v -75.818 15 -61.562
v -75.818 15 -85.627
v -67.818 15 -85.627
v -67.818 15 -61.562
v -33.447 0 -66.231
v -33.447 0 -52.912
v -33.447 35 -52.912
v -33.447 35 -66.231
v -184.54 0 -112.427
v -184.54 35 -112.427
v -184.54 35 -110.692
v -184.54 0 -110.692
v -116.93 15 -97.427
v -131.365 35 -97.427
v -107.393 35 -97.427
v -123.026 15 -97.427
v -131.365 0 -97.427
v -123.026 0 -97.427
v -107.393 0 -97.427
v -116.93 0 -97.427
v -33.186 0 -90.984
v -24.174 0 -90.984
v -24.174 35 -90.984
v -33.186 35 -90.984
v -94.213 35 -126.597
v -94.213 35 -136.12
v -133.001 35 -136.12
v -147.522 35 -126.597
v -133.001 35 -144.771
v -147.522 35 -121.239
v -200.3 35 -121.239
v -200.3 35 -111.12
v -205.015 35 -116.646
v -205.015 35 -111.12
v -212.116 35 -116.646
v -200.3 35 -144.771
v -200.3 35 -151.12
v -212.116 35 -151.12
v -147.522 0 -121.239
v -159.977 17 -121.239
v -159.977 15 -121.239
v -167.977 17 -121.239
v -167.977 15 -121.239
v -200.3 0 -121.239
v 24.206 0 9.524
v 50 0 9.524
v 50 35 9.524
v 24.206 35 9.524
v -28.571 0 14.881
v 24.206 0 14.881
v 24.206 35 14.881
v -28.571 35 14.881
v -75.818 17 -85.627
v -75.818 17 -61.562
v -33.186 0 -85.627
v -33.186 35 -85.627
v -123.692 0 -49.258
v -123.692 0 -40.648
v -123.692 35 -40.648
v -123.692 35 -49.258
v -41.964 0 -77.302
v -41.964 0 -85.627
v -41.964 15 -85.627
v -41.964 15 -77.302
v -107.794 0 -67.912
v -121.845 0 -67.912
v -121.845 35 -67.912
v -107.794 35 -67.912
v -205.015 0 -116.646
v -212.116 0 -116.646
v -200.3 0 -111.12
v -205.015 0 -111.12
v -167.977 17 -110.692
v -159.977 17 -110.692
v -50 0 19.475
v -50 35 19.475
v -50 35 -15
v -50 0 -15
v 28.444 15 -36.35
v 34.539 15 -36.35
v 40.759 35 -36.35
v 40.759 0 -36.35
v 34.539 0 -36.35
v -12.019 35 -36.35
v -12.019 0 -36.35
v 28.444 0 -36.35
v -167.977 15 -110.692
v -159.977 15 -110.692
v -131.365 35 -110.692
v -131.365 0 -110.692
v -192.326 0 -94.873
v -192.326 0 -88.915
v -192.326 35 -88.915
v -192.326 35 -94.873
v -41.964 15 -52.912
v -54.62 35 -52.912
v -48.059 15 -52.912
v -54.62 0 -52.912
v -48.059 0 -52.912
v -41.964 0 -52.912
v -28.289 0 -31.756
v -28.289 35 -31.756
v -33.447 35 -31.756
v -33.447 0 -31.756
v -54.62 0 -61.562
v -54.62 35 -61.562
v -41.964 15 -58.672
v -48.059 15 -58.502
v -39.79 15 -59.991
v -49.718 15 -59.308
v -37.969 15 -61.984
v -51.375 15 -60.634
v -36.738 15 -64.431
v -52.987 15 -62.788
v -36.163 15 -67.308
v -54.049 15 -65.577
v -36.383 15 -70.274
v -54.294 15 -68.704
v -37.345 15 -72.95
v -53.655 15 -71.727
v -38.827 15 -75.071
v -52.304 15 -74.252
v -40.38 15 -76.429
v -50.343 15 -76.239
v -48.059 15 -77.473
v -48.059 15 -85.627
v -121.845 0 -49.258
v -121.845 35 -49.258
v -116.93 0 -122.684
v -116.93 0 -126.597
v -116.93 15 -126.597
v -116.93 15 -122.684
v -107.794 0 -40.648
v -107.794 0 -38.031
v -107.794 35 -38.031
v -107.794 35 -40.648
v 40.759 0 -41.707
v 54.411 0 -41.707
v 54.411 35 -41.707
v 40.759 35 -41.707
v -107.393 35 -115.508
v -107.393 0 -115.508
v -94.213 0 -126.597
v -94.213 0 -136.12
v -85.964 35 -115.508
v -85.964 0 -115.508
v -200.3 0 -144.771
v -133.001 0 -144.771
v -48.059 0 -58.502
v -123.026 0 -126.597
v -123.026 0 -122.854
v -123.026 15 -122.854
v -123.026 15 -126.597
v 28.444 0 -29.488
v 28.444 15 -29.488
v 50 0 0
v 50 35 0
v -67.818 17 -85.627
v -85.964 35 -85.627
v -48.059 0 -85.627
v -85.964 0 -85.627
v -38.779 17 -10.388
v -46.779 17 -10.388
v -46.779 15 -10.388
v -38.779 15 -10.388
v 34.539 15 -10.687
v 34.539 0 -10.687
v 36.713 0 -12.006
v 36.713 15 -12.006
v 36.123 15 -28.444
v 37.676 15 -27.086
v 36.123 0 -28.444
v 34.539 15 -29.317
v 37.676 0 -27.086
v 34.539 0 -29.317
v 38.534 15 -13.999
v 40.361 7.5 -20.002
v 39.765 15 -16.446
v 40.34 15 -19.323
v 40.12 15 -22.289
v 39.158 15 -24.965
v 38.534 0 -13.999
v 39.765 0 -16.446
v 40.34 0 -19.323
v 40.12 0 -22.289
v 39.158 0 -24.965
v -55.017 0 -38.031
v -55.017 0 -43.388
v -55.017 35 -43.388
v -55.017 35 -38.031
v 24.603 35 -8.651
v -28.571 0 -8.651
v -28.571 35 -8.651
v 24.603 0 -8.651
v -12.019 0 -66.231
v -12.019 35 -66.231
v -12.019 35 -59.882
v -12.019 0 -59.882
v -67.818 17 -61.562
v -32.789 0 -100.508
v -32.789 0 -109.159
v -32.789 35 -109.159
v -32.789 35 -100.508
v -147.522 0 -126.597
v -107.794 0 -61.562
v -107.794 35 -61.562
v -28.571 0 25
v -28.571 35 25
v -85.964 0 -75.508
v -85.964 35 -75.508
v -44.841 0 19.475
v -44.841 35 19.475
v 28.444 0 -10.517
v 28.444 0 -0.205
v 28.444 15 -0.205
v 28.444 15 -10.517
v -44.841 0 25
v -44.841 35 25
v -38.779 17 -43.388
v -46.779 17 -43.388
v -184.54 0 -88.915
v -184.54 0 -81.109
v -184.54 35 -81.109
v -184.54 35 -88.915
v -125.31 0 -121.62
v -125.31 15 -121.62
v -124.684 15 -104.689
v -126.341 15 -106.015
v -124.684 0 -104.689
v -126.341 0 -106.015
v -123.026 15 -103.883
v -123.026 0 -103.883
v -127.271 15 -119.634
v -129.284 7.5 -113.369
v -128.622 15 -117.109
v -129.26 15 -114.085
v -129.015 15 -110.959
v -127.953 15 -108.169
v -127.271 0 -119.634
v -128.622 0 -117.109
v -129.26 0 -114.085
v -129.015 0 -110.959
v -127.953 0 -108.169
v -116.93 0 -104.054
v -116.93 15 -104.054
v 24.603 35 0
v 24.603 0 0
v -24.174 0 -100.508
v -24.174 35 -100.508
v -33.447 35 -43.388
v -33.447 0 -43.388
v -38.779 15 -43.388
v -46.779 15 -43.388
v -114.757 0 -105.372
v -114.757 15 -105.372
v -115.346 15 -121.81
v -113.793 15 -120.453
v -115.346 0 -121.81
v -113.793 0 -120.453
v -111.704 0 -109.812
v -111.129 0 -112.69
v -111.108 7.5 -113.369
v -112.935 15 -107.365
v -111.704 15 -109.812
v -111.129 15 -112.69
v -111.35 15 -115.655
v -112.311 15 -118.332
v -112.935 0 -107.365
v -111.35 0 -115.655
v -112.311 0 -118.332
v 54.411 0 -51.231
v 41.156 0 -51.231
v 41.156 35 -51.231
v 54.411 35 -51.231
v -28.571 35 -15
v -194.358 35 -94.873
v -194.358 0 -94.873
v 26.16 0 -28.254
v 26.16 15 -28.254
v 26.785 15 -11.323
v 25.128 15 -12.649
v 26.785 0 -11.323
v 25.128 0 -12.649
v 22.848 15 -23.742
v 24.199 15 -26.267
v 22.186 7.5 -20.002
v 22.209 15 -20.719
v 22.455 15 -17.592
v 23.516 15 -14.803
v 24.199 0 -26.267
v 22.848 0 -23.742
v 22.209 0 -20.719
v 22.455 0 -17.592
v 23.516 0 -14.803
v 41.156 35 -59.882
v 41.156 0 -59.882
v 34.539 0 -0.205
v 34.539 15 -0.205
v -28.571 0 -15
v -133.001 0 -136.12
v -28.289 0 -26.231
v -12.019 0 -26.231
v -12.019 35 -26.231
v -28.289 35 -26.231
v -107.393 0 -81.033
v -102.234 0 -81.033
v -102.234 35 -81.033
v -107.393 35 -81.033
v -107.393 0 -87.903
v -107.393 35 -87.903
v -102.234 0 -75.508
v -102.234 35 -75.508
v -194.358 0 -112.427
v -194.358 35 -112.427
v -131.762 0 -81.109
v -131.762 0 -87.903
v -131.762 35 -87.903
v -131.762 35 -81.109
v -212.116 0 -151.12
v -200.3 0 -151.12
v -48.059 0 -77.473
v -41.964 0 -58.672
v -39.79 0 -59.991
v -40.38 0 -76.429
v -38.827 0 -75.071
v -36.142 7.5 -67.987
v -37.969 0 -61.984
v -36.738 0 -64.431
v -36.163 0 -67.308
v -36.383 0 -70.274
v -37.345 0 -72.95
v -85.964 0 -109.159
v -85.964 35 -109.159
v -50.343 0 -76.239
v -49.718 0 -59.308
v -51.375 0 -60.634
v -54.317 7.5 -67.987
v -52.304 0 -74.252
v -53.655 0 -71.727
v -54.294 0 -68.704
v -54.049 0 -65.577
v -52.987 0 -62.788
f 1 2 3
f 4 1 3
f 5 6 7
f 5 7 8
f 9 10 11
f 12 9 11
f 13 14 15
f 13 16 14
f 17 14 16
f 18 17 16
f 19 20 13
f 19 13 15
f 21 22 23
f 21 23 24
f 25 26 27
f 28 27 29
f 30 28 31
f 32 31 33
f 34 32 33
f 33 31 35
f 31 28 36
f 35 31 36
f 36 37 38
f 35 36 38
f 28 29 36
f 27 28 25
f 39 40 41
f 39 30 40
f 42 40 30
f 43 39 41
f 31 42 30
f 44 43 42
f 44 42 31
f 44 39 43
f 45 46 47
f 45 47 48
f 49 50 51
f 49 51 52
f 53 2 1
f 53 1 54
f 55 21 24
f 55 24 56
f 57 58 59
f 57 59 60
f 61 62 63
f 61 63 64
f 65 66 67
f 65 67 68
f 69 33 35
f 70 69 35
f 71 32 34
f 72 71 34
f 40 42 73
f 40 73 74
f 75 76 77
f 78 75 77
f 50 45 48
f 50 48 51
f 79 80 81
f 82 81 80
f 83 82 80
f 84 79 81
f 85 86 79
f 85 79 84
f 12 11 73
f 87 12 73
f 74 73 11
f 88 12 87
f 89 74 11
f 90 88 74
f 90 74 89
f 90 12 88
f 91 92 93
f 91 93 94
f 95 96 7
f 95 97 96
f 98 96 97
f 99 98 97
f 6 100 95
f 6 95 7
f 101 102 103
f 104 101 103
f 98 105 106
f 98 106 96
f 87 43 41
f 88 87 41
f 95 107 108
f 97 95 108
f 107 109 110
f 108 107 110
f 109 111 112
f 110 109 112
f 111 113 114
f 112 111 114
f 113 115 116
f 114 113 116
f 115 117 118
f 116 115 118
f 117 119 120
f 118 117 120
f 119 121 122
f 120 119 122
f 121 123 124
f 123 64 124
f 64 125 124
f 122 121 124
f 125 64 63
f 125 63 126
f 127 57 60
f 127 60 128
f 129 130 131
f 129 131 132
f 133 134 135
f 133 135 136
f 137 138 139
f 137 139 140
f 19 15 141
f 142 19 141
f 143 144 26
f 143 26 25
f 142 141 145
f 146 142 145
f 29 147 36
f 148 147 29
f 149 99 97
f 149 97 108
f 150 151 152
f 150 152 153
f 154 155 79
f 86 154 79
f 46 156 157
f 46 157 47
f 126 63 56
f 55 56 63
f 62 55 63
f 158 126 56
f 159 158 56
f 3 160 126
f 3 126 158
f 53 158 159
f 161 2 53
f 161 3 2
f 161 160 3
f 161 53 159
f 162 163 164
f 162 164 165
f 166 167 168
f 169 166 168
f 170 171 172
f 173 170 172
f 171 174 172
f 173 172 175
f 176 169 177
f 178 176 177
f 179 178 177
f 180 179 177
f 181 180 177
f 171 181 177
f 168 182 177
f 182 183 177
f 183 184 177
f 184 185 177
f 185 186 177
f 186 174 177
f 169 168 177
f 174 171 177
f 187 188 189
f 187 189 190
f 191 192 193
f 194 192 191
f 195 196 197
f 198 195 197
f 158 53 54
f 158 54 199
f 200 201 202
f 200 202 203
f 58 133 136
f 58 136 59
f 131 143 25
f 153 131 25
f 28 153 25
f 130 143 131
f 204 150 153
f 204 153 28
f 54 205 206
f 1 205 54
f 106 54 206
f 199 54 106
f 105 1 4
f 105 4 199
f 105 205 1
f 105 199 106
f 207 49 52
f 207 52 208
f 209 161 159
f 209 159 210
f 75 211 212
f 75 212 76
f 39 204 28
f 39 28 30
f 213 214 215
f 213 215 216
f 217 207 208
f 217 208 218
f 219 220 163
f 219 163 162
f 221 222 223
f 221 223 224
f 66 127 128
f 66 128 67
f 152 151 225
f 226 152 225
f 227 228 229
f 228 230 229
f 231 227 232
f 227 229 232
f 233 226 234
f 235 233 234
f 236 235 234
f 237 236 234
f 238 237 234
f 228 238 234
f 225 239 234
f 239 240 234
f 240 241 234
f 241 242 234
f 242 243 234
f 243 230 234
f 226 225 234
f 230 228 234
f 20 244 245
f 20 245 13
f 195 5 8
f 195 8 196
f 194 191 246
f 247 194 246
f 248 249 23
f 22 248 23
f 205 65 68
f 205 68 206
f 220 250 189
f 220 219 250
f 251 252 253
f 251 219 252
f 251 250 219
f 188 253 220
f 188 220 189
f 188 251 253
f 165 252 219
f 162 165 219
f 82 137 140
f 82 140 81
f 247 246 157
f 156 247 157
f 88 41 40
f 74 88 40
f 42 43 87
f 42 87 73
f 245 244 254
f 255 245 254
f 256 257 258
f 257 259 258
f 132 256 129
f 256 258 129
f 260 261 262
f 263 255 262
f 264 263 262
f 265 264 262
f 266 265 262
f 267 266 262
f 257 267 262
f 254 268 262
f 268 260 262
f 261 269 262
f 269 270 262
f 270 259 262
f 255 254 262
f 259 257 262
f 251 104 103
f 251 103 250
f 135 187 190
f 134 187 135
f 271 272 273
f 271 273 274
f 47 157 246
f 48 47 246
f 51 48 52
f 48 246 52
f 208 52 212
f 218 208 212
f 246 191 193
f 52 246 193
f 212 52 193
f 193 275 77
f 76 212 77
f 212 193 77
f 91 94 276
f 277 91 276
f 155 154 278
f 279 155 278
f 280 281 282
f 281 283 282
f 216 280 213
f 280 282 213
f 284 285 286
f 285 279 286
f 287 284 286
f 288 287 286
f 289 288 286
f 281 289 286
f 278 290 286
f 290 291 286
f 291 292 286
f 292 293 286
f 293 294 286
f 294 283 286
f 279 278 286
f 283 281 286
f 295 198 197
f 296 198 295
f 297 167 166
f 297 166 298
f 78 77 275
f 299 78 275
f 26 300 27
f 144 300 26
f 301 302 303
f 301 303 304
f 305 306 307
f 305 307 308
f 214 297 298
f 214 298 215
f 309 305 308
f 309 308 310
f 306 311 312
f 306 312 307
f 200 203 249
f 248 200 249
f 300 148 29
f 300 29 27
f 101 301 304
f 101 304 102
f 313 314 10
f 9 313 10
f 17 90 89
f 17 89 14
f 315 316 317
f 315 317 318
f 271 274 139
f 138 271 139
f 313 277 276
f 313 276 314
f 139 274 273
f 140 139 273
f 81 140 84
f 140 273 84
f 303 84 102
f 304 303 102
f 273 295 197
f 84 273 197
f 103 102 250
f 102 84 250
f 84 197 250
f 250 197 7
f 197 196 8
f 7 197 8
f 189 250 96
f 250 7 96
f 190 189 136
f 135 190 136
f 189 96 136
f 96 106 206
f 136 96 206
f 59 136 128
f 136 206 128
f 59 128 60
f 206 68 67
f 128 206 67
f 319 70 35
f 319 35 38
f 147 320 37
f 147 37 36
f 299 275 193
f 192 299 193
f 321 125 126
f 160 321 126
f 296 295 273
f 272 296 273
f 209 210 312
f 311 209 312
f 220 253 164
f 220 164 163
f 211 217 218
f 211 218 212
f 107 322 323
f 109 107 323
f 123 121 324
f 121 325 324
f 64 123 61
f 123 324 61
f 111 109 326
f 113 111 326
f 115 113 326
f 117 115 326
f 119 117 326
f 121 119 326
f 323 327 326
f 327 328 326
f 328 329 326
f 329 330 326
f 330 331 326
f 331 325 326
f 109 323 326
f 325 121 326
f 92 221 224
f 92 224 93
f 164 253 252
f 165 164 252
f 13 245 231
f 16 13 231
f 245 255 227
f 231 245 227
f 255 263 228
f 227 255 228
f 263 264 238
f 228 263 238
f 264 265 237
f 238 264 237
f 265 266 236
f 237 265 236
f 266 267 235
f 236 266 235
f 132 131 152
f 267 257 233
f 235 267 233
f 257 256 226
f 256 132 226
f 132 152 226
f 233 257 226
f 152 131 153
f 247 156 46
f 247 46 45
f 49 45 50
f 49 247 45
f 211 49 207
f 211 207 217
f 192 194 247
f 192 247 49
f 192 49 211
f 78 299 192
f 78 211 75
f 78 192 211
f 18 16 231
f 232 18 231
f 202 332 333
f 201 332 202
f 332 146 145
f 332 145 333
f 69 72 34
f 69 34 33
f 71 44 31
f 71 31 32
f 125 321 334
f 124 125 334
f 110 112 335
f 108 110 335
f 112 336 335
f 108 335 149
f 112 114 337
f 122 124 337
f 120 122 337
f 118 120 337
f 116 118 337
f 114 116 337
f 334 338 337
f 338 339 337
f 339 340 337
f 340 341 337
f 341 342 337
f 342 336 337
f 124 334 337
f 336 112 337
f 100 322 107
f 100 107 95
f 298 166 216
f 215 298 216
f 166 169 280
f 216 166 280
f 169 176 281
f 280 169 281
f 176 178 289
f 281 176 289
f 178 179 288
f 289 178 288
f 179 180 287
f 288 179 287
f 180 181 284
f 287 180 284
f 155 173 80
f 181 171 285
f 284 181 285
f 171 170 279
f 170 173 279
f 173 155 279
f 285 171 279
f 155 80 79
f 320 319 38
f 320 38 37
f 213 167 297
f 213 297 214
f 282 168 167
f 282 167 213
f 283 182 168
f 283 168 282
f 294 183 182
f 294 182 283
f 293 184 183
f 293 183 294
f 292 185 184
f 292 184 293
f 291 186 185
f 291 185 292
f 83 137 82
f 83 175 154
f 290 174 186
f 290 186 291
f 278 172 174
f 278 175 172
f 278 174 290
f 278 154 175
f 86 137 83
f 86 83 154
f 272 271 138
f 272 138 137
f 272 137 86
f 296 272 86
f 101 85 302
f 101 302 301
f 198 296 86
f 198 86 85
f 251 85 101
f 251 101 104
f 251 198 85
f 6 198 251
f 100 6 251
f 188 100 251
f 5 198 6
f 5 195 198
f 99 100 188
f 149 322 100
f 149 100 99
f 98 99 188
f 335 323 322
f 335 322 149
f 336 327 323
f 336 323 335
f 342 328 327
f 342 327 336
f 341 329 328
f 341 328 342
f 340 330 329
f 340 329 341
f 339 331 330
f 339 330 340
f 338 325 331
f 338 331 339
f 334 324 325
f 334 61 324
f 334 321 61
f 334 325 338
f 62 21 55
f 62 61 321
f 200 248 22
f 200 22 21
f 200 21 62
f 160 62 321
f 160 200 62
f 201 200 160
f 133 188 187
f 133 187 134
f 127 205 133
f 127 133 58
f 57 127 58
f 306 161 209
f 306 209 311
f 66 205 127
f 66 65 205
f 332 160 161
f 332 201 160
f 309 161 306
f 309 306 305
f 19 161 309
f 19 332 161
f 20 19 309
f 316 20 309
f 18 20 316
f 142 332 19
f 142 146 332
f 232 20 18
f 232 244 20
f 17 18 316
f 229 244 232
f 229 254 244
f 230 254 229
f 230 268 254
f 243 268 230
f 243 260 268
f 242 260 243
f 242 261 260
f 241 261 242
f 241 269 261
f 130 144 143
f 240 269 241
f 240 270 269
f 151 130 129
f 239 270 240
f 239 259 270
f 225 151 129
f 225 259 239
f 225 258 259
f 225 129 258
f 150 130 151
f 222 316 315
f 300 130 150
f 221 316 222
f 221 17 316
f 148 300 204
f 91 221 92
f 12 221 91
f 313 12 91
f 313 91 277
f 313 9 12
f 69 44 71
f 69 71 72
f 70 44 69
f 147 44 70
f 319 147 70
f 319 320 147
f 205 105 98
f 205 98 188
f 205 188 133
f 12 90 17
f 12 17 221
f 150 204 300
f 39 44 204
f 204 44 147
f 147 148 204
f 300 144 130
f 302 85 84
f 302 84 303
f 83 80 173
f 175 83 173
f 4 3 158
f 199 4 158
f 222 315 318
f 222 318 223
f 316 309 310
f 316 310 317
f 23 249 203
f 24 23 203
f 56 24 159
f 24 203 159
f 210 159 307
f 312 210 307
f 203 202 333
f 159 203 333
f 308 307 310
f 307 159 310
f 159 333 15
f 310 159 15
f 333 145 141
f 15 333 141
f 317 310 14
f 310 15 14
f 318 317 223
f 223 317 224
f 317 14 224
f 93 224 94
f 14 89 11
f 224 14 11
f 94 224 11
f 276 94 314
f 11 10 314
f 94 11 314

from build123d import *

# Parameters (mm, degrees)
EXTRUDE_1_DEPTH   = 35
EXTRUDE_1_2_DEPTH = 35
EXTRUDE_1_3_DEPTH = 35
EXTRUDE_1_4_DEPTH = 35
EXTRUDE_2_DEPTH   = 15
SKETCH_3_W        = 8
SKETCH_3_H        = 2
EXTRUDE_3_DEPTH   = 23
SKETCH_4_W        = 8
SKETCH_4_H        = 2
EXTRUDE_4_DEPTH   = 30
SKETCH_5_W        = 8
SKETCH_5_H        = 2
EXTRUDE_5_DEPTH   = 33


with BuildPart() as part:
    # 草图1 → 凸台-拉伸1 (new body)
    with BuildSketch(Plane(origin=(0, 0, 0), x_dir=(1, 0, 0), z_dir=(0, 1, 0))):
        Polygon((-50, 15), (-28.571428571, 15), (-28.571428571, 8.650793651), (24.603174603, 8.650793651), (24.603174603, 0), (50, 0), (50, -9.523809524), (24.206349206, -9.523809524), (24.206349206, -14.880952381), (-28.571428571, -14.880952381), (-28.571428571, -25), (-44.841269841, -25), (-44.841269841, -19.474869842), (-50, -19.474869842), align=None)
    extrude(amount=EXTRUDE_1_DEPTH)


with BuildPart() as body_2:
    # 草图1 → Extrude 1 2 (new body)
    with BuildSketch(Plane(origin=(0, 0, 0), x_dir=(1, 0, 0), z_dir=(0, 1, 0))):
        Polygon((-107.794400387, 61.56232169), (-54.619797212, 61.56232169), (-54.619797212, 52.91152804), (-33.447399942, 52.91152804), (-33.447399942, 66.231254849), (-12.018828513, 66.231254849), (-12.018828513, 59.8820485), (41.155774662, 59.8820485), (41.155774662, 51.231254849), (54.410686269, 51.231254849), (54.410686269, 41.707445325), (40.758949265, 41.707445325), (40.758949265, 36.350302468), (-12.018828513, 36.350302468), (-12.018828513, 26.231254849), (-28.288669783, 26.231254849), (-28.288669783, 31.756385007), (-33.447399942, 31.756385007), (-33.447399942, 43.387718516), (-55.016622609, 43.387718516), (-55.016622609, 38.030575659), (-107.794400387, 38.030575659), (-107.794400387, 40.648099537), (-123.6923492, 40.648099537), (-123.6923492, 49.25836902), (-121.845067006, 49.25836902), (-121.845067006, 67.91152804), (-107.794400387, 67.91152804), align=None)
    extrude(amount=EXTRUDE_1_2_DEPTH)



with BuildPart() as body_3:
    # 草图1 → Extrude 1 3 (new body)
    with BuildSketch(Plane(origin=(0, 0, 0), x_dir=(1, 0, 0), z_dir=(0, 1, 0))):
        Polygon((-184.539969284, 110.691667643), (-131.365366109, 110.691667643), (-131.365366109, 97.427275906), (-107.392513521, 97.427275906), (-107.392513521, 115.507776756), (-85.963942093, 115.507776756), (-85.963942093, 109.158570406), (-32.789338918, 109.158570406), (-32.789338918, 100.507776756), (-24.173934052, 100.507776756), (-24.173934052, 90.983967232), (-33.186164315, 90.983967232), (-33.186164315, 85.626824375), (-85.963942093, 85.626824375), (-85.963942093, 75.507776756), (-102.233783362, 75.507776756), (-102.233783362, 81.032906914), (-107.392513521, 81.032906914), (-107.392513521, 87.903466382), (-131.762191506, 87.903466382), (-131.762191506, 81.109403196), (-184.539969284, 81.109403196), (-184.539969284, 88.915387374), (-192.325966845, 88.915387374), (-192.325966845, 94.87339593), (-194.358266929, 94.87339593), (-194.358266929, 112.427275906), (-184.539969284, 112.427275906), align=None)
    extrude(amount=EXTRUDE_1_3_DEPTH)


with BuildPart() as body_4:
    # 草图1 → Extrude 1 4 (new body)
    with BuildSketch(Plane(origin=(0, 0, 0), x_dir=(1, 0, 0), z_dir=(0, 1, 0))):
        Polygon((-200.299569392, 144.7711918), (-133.000655414, 144.7711918), (-133.000655414, 136.120398149), (-94.213200191, 136.120398149), (-94.213200191, 126.596588625), (-147.521791614, 126.596588625), (-147.521791614, 121.239445768), (-200.299569392, 121.239445768), (-200.299569392, 111.120398149), (-205.014733331, 111.120398149), (-205.014733331, 116.645528307), (-212.116113646, 116.645528307), (-212.116113646, 151.120398149), (-200.299569392, 151.120398149), align=None)
    extrude(amount=EXTRUDE_1_4_DEPTH)


with BuildPart() as body_2_1:
    add(body_2.part)

    add(body_3.part)  # 凸台-拉伸2 merges body 3

    add(body_4.part)  # 凸台-拉伸2 merges body 4
    # 草图2 → 凸台-拉伸2 (add)
    with BuildSketch(Plane(origin=(0, 0, 0), x_dir=(1, 0, 0), z_dir=(0, 1, 0))):
        with BuildLine():
            Line((28.443898962, 29.487740992), (28.443898962, 41.999795529))
            Line((28.443898962, 41.999795529), (34.539192055, 40.886907122))
            Line((34.539192055, 40.886907122), (34.539192055, 29.317255347))
            add(Edge.make_bspline(
                [(34.539192055, 10.687190226), (56.564255054, 20.002222786), (34.539192055, 29.317255347)],
                knots=[0.367556342, 0.367556342, 0.367556342, 2.774036311, 2.774036311, 2.774036311], degree=2, weights=[1, 0.359336066, 1]))
            Line((34.539192055, 10.687190226), (34.539192055, 0.204653136))
            Line((34.539192055, 0.204653136), (28.443898962, 0.204653136))
            Line((28.443898962, 0.204653136), (28.443898962, 10.516704581))
            add(Edge.make_bspline(
                [(28.443898962, 29.487740992), (2.087181458, 20.002222786), (28.443898962, 10.516704581)],
                knots=[3.458229464, 3.458229464, 3.458229464, 5.966548497, 5.966548497, 5.966548497], degree=2, weights=[1, 0.311372329, 1]))
        make_face()
        with BuildLine():
            Line((-48.059265181, 77.472796895), (-48.059265181, 89.984851433))
            Line((-48.059265181, 89.984851433), (-41.963972088, 88.871963026))
            Line((-41.963972088, 88.871963026), (-41.963972088, 77.30231125))
            add(Edge.make_bspline(
                [(-41.963972088, 58.67224613), (-19.938909089, 67.98727869), (-41.963972088, 77.30231125)],
                knots=[0.367556342, 0.367556342, 0.367556342, 2.774036311, 2.774036311, 2.774036311], degree=2, weights=[1, 0.359336066, 1]))
            Line((-41.963972088, 58.67224613), (-41.963972088, 48.18970904))
            Line((-41.963972088, 48.18970904), (-48.059265181, 48.18970904))
            Line((-48.059265181, 48.18970904), (-48.059265181, 58.501760485))
            add(Edge.make_bspline(
                [(-48.059265181, 77.472796895), (-74.415982685, 67.98727869), (-48.059265181, 58.501760485)],
                knots=[3.458229464, 3.458229464, 3.458229464, 5.966548497, 5.966548497, 5.966548497], degree=2, weights=[1, 0.311372329, 1]))
        make_face()
        with BuildLine():
            Line((-123.025536653, 135.366292674), (-116.93024356, 134.253404267))
            Line((-116.93024356, 134.253404267), (-116.93024356, 122.683752491))
            add(Edge.make_bspline(
                [(-116.93024356, 104.053687371), (-94.905180561, 113.368719931), (-116.93024356, 122.683752491)],
                knots=[0.367556342, 0.367556342, 0.367556342, 2.774036311, 2.774036311, 2.774036311], degree=2, weights=[1, 0.359336066, 1]))
            Line((-116.93024356, 104.053687371), (-116.93024356, 93.571150281))
            Line((-116.93024356, 93.571150281), (-123.025536653, 93.571150281))
            Line((-123.025536653, 93.571150281), (-123.025536653, 103.883201726))
            add(Edge.make_bspline(
                [(-123.025536653, 122.854238137), (-149.382254157, 113.368719931), (-123.025536653, 103.883201726)],
                knots=[3.458229464, 3.458229464, 3.458229464, 5.966548497, 5.966548497, 5.966548497], degree=2, weights=[1, 0.311372329, 1]))
            Line((-123.025536653, 122.854238137), (-123.025536653, 135.366292674))
        make_face()
    extrude(amount=EXTRUDE_2_DEPTH)

    # 草图3 → 凸台-拉伸3 (add)
    with BuildSketch(Plane.XY.offset(-121.239445768)):
        with Locations((-163.976955411, 16)):
            Rectangle(SKETCH_3_W, SKETCH_3_H)
    extrude(amount=EXTRUDE_3_DEPTH)

    # 草图4 → 凸台-拉伸4 (add)
    with BuildSketch(Plane.XY.offset(-87.903466382)):
        with Locations((-71.817837358, 16)):
            Rectangle(SKETCH_4_W, SKETCH_4_H)
    extrude(amount=EXTRUDE_4_DEPTH)

    # 草图5 → 凸台-拉伸5 (add)
    with BuildSketch(Plane.XY.offset(-43.387718516)):
        with Locations((-42.779110495, 16)):
            Rectangle(SKETCH_5_W, SKETCH_5_H)
    extrude(amount=EXTRUDE_5_DEPTH)


solid = Compound([part.part, body_2_1.part])
